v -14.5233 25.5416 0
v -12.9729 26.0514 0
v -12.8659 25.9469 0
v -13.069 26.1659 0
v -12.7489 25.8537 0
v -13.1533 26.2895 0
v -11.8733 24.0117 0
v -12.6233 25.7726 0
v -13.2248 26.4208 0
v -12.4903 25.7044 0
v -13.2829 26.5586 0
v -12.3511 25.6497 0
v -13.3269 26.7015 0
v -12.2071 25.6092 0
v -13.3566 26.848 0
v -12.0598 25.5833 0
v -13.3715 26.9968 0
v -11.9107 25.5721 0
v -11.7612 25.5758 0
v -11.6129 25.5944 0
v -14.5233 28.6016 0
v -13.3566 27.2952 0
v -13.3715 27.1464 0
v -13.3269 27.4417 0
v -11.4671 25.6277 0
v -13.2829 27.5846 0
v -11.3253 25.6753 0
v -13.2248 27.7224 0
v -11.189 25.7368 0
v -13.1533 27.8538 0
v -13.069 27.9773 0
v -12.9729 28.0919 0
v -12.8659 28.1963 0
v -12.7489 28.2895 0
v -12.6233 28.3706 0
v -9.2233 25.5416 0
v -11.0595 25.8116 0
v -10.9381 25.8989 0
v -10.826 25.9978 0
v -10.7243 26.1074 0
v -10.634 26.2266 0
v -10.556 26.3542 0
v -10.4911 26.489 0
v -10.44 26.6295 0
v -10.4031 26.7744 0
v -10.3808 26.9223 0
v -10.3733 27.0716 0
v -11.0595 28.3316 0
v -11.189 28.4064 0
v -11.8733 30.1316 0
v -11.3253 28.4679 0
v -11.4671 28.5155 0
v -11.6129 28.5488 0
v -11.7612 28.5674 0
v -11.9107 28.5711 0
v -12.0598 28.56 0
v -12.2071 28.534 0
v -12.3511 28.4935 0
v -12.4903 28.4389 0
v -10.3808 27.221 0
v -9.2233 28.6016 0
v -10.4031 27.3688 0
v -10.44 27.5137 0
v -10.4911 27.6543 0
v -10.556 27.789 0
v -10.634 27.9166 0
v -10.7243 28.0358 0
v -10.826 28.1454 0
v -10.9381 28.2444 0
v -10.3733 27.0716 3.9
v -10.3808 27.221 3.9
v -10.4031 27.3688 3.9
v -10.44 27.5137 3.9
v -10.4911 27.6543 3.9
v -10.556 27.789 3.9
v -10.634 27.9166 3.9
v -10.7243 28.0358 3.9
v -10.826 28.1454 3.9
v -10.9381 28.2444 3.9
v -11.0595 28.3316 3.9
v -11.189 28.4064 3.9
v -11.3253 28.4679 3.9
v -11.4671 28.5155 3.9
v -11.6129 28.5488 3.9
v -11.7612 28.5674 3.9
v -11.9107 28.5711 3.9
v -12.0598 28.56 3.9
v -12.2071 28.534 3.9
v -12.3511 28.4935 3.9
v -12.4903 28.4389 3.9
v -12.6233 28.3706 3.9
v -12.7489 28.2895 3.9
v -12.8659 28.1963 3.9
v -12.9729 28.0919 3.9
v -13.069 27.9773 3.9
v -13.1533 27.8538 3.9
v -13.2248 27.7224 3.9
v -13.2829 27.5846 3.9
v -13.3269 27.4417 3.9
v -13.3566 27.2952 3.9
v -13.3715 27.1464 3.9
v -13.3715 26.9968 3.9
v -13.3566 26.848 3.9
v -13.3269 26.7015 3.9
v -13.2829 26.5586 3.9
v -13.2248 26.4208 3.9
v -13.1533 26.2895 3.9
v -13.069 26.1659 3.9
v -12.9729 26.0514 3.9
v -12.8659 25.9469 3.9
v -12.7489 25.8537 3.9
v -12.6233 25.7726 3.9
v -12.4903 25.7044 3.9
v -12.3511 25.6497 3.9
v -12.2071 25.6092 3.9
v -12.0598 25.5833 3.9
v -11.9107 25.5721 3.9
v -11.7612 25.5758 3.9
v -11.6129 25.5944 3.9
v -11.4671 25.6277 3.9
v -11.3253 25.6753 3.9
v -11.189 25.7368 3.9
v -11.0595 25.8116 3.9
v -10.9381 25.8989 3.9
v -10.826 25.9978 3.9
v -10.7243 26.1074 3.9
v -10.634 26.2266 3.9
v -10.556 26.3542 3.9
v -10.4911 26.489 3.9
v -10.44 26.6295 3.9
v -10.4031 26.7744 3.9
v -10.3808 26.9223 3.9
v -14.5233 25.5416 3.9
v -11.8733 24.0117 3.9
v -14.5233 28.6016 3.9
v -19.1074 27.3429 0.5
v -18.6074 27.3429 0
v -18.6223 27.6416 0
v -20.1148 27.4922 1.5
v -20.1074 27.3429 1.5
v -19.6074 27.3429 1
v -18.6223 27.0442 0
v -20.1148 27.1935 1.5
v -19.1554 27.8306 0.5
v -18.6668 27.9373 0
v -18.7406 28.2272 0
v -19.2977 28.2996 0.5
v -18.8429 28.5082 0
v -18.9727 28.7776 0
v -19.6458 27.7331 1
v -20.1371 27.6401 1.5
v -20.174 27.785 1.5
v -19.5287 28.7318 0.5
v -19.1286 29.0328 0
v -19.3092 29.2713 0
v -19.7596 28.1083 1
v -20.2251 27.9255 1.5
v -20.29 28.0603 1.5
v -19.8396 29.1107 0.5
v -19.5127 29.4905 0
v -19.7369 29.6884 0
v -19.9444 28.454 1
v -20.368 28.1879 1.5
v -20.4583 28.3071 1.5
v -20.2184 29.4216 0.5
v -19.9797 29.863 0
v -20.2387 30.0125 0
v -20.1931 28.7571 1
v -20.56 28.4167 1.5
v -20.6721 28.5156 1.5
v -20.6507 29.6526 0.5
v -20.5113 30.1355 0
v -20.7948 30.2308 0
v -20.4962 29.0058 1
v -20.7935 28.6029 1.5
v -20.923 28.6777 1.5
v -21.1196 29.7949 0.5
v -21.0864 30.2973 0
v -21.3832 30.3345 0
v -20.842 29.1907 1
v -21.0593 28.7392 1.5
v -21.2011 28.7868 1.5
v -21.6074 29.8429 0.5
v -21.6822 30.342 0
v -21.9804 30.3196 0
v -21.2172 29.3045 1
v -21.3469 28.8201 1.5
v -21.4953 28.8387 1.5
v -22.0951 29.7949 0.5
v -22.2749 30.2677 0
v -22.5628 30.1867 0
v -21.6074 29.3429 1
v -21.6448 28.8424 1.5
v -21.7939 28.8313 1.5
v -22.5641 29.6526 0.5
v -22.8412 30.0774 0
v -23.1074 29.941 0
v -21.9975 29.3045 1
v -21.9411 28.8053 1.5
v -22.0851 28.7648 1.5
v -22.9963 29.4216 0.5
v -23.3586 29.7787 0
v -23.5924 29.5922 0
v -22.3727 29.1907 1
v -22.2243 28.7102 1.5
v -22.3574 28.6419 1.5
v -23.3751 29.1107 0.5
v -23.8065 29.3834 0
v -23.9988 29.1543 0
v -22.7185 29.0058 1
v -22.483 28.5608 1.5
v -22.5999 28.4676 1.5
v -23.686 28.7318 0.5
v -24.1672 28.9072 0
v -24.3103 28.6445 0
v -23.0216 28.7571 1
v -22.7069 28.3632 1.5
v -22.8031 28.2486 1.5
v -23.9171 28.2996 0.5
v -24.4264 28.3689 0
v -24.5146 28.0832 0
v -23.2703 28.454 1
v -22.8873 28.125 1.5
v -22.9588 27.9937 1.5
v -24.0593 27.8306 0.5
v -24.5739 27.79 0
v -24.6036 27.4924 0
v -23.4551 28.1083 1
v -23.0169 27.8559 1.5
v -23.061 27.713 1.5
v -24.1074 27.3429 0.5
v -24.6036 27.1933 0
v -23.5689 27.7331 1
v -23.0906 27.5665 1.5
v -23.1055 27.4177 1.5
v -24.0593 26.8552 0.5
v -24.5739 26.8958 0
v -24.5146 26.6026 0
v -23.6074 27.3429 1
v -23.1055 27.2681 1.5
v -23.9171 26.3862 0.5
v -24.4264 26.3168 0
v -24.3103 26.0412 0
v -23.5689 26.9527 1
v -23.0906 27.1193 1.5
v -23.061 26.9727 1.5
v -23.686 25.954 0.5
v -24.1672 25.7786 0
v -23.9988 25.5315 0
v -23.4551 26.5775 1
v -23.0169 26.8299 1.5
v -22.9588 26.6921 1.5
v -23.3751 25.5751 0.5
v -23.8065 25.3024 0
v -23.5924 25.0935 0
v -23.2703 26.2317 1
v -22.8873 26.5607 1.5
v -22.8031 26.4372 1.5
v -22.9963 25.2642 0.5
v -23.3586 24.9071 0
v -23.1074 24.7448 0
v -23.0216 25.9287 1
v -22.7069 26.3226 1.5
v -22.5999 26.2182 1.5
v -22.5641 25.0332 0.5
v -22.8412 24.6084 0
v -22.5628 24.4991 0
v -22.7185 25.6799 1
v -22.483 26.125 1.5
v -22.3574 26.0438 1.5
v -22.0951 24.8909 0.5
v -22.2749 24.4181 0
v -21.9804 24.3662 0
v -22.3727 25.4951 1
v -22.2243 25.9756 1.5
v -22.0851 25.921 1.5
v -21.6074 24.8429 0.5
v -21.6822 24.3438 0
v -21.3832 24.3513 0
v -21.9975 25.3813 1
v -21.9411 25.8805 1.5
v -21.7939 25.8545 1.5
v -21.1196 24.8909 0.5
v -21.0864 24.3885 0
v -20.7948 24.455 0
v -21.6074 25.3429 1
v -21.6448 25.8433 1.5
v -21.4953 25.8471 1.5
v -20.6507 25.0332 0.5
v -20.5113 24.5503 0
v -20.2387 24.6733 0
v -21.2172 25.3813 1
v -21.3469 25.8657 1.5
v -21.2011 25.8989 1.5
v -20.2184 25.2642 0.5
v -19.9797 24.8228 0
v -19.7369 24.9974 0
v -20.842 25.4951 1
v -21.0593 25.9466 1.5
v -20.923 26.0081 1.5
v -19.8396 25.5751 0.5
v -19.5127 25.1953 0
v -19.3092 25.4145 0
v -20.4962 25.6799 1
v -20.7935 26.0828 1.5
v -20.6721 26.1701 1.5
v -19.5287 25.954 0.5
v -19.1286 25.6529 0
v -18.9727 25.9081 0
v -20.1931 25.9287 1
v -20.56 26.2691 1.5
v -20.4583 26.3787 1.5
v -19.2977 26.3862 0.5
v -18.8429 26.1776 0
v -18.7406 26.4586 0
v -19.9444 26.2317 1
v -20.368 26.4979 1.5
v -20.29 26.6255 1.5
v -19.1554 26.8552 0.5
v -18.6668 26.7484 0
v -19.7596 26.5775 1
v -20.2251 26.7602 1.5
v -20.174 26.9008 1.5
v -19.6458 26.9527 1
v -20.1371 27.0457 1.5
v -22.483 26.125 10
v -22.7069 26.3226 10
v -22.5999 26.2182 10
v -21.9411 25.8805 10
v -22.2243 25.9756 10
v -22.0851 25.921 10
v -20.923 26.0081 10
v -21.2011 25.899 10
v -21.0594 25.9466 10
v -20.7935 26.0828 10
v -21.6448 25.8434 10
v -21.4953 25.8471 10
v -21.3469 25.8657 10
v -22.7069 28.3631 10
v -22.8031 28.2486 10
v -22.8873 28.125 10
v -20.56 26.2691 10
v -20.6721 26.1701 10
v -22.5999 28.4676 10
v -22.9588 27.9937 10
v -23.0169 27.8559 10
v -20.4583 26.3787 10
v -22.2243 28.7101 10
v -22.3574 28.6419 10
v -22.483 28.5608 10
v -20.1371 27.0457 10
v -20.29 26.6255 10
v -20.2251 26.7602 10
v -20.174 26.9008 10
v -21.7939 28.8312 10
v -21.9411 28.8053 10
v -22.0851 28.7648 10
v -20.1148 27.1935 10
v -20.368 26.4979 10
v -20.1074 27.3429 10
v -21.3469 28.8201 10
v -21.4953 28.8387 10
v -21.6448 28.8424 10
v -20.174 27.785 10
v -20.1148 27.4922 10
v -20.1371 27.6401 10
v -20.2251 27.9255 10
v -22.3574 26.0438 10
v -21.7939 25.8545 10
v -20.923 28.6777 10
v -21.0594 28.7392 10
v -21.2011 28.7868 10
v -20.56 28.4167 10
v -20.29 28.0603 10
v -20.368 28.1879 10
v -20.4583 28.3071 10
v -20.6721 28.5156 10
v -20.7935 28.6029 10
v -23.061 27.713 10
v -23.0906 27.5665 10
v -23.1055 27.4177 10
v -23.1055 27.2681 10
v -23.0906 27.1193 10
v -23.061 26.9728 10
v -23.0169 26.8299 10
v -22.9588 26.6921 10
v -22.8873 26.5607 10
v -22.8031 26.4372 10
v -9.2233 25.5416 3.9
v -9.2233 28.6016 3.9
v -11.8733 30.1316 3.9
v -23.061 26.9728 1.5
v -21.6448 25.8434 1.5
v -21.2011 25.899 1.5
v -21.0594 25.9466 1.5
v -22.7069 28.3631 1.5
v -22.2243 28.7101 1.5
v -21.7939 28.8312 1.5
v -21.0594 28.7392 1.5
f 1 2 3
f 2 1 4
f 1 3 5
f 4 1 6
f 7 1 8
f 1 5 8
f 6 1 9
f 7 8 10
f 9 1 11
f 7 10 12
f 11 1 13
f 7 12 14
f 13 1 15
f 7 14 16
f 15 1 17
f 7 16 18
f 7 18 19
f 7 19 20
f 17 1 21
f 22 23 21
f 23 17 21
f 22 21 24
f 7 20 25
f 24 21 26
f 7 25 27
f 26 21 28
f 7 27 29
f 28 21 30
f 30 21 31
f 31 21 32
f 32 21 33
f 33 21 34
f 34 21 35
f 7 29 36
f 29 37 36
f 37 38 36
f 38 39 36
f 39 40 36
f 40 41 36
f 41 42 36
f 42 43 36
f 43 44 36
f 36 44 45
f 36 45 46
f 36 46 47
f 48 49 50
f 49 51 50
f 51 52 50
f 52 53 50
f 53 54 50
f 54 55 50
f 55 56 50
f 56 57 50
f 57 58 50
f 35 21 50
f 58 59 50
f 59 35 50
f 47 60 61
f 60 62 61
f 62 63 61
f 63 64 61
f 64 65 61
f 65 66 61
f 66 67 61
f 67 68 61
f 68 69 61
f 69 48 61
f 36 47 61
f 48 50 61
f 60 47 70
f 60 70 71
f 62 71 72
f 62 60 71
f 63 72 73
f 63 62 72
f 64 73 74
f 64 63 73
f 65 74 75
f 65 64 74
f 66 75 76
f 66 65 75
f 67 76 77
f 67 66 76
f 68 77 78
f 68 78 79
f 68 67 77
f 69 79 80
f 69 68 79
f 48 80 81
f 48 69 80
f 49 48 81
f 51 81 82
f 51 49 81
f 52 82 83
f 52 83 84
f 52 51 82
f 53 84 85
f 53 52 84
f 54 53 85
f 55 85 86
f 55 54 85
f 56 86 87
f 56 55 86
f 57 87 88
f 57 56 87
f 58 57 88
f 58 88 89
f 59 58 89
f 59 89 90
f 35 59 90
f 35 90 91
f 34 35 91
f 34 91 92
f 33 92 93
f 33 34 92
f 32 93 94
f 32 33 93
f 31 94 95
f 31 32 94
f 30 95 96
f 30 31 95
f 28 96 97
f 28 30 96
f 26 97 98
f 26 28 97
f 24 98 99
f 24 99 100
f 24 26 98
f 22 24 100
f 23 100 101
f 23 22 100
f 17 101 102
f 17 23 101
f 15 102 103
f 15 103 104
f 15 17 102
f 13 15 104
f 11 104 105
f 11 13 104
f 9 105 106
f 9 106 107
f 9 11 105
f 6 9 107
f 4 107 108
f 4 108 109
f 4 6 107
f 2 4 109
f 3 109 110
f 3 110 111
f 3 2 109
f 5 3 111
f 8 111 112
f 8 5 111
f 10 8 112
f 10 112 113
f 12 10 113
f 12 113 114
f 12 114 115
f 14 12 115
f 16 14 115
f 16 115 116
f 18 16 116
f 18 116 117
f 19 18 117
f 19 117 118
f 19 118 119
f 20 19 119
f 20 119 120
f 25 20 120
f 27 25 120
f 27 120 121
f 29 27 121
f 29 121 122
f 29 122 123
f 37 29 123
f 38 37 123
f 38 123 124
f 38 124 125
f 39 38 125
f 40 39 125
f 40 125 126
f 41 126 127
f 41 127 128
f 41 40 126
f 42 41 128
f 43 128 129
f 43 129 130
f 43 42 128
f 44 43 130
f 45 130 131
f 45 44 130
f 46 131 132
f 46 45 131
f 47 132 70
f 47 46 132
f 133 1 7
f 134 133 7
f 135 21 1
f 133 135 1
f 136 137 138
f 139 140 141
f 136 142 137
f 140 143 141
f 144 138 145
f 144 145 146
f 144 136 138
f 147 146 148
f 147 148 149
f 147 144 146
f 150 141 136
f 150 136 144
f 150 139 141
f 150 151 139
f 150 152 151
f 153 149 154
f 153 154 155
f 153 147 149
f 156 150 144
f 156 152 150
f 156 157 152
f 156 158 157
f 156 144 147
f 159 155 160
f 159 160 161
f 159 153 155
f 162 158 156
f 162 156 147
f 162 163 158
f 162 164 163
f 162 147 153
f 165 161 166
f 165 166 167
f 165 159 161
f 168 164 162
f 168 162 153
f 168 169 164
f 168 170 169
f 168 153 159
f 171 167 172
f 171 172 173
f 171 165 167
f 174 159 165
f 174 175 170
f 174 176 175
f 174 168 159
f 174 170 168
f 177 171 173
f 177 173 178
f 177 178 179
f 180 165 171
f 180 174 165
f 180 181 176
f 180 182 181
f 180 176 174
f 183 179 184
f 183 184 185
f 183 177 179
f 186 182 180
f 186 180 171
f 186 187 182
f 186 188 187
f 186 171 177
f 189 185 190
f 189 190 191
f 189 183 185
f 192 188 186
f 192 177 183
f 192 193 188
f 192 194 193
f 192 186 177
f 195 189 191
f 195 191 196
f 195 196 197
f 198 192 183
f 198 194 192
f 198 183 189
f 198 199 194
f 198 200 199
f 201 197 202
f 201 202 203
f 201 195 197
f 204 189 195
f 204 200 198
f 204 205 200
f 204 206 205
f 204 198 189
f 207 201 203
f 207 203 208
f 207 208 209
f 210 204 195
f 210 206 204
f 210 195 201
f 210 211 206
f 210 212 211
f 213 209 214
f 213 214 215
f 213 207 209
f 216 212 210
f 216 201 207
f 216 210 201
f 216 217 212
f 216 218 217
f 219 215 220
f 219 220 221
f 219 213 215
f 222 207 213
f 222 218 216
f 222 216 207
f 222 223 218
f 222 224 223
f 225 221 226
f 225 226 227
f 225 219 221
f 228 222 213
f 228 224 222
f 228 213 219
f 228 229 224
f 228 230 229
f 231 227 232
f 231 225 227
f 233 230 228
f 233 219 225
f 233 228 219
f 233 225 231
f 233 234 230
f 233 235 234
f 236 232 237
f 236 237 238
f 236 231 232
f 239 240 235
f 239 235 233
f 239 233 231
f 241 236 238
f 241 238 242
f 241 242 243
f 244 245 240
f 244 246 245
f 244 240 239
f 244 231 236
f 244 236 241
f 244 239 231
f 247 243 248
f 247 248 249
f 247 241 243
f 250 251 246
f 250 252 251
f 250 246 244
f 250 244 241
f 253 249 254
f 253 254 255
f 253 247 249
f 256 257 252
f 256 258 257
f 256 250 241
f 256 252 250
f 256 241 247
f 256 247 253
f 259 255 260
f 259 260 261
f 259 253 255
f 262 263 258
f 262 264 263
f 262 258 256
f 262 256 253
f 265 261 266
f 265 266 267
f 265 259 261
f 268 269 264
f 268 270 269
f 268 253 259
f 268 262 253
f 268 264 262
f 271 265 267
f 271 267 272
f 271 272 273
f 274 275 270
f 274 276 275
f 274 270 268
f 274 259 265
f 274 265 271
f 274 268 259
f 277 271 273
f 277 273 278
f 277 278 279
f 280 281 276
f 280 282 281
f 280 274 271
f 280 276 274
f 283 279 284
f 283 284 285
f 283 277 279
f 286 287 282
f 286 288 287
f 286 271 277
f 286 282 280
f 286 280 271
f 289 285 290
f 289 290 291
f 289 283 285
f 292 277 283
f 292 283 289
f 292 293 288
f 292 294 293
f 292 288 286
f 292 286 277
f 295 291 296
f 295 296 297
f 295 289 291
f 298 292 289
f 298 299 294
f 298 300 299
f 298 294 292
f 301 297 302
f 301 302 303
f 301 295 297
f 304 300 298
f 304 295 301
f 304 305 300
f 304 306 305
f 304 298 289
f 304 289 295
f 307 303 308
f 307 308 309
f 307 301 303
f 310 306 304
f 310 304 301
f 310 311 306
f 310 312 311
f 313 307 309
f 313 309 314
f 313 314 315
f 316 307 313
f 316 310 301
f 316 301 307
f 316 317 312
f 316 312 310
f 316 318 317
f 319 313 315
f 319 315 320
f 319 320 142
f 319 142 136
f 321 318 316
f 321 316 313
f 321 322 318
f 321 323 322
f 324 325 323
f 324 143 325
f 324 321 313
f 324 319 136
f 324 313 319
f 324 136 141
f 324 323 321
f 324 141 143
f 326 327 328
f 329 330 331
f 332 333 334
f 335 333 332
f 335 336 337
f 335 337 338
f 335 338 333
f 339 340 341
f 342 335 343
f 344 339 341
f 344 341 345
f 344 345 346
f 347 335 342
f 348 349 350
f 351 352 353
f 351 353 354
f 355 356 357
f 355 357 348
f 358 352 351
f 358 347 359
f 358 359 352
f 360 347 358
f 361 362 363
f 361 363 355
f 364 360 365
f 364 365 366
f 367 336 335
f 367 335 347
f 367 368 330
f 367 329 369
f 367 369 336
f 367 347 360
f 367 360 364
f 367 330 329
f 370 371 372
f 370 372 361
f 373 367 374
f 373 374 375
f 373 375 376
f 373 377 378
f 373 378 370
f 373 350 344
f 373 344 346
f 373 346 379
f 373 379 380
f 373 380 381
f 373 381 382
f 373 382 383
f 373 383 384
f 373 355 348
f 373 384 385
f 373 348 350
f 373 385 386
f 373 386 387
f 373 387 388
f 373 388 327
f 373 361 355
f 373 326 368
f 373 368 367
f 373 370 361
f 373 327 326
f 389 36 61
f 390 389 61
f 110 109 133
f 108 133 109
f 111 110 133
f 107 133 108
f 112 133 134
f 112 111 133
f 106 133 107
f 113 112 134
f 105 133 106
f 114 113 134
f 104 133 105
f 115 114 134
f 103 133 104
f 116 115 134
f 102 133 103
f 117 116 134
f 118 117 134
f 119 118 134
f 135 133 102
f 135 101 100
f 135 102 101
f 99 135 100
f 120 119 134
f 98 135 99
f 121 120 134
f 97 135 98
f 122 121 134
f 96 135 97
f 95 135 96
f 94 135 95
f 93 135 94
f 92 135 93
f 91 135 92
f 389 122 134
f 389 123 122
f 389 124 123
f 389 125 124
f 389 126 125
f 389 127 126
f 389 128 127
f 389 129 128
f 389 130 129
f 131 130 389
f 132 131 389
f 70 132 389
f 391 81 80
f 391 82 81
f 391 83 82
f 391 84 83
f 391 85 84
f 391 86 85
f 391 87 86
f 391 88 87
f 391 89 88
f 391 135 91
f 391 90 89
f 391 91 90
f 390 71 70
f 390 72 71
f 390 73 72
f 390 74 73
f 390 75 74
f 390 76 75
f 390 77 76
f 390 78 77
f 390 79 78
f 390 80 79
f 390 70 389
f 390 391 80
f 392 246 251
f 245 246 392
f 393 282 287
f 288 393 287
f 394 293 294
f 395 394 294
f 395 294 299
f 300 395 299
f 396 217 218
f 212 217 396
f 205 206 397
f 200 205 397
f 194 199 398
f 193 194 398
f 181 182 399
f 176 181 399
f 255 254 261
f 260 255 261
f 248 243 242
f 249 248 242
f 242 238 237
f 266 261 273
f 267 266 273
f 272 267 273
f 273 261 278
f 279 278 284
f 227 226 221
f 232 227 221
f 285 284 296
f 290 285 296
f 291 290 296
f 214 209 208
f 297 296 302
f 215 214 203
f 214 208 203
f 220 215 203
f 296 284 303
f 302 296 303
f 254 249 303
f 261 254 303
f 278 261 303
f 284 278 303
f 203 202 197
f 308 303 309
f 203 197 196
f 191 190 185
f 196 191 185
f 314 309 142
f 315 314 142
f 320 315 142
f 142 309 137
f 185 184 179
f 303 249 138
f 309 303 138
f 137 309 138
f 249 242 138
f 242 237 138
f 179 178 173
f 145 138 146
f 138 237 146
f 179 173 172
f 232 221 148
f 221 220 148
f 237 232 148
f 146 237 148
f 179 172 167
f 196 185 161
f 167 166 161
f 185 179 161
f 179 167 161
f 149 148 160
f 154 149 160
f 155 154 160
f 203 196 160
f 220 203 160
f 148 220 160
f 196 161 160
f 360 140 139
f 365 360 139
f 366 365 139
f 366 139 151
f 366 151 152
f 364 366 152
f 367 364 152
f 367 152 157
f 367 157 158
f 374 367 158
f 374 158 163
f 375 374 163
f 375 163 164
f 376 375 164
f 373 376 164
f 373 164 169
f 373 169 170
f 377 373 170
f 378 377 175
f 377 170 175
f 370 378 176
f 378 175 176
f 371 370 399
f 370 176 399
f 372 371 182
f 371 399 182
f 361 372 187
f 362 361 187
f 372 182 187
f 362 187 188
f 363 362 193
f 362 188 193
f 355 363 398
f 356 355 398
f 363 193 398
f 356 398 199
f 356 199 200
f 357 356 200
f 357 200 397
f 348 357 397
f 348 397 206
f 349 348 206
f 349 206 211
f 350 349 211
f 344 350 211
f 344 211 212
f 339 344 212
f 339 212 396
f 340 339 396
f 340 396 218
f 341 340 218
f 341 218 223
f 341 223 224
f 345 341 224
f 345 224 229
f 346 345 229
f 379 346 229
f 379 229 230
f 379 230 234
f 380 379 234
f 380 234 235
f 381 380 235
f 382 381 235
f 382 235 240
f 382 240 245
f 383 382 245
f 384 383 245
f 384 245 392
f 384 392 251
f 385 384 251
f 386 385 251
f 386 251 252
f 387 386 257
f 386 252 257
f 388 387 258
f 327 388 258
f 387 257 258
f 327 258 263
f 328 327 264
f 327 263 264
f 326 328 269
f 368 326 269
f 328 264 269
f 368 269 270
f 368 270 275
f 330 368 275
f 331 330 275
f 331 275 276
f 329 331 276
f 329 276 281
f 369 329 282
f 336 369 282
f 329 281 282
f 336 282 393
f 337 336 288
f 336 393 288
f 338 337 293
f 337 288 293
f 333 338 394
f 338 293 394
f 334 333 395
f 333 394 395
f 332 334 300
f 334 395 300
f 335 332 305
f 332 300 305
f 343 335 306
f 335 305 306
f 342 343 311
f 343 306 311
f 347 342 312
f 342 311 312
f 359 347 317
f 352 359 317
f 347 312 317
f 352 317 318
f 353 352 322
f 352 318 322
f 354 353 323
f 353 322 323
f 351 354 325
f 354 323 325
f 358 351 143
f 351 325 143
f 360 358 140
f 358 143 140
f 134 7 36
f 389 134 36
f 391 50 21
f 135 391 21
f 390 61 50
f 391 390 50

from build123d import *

# Parameters (mm, degrees)
F0_R     = 1.5
F1_DEPTH = 10
F0_R_2   = 3
F2_DEPTH = 1.5
F3_SIZE  = 1.49999
F4_DEPTH = 3.9


# Not quite as in the source:
# - a fillet or chamfer is up to 0.001 mm smaller than in the source, because OpenCascade refuses the exact size


with BuildPart() as f1:
    # F0 (on Top) → F1 (new body)
    with BuildSketch(Plane.XY):
        with Locations((-21.6073635966, 27.3428875953)):
            Circle(F0_R)
    extrude(amount=F1_DEPTH)

    # F0 (on Top) → F2 (join)
    with BuildSketch(Plane.XY):
        with Locations((-21.6073635966, 27.3428875953)):
            Circle(F0_R_2)
        with Locations((-21.6073635966, 27.3428875953)):
            Circle(F0_R, mode=Mode.SUBTRACT)
    extrude(amount=F2_DEPTH)

    # F3 (size 1.5 in the source; OpenCascade refuses exactly that, so slightly less here)
    f3_edges = [f1.edges().sort_by_distance(p)[0] for p in [
        (-24.607364, 27.342888, 1.5),
    ]]
    chamfer(f3_edges, length=F3_SIZE)


with BuildPart() as f4:
    # F0 (on Top) → F4 (new body)
    with BuildSketch(Plane.XY):
        Polygon((-9.2233226543, 25.5416321092), (-9.2233226543, 28.6015885359), (-11.8733226543, 30.1315667493), (-14.5233226543, 28.6015885359), (-14.5233226543, 25.5416321092), (-11.8733226543, 24.0116538959), align=None)
        with Locations((-11.8733226543, 27.0716103226)):
            Circle(F0_R, mode=Mode.SUBTRACT)
    extrude(amount=F4_DEPTH)


solid = Compound([f1.part, f4.part])
